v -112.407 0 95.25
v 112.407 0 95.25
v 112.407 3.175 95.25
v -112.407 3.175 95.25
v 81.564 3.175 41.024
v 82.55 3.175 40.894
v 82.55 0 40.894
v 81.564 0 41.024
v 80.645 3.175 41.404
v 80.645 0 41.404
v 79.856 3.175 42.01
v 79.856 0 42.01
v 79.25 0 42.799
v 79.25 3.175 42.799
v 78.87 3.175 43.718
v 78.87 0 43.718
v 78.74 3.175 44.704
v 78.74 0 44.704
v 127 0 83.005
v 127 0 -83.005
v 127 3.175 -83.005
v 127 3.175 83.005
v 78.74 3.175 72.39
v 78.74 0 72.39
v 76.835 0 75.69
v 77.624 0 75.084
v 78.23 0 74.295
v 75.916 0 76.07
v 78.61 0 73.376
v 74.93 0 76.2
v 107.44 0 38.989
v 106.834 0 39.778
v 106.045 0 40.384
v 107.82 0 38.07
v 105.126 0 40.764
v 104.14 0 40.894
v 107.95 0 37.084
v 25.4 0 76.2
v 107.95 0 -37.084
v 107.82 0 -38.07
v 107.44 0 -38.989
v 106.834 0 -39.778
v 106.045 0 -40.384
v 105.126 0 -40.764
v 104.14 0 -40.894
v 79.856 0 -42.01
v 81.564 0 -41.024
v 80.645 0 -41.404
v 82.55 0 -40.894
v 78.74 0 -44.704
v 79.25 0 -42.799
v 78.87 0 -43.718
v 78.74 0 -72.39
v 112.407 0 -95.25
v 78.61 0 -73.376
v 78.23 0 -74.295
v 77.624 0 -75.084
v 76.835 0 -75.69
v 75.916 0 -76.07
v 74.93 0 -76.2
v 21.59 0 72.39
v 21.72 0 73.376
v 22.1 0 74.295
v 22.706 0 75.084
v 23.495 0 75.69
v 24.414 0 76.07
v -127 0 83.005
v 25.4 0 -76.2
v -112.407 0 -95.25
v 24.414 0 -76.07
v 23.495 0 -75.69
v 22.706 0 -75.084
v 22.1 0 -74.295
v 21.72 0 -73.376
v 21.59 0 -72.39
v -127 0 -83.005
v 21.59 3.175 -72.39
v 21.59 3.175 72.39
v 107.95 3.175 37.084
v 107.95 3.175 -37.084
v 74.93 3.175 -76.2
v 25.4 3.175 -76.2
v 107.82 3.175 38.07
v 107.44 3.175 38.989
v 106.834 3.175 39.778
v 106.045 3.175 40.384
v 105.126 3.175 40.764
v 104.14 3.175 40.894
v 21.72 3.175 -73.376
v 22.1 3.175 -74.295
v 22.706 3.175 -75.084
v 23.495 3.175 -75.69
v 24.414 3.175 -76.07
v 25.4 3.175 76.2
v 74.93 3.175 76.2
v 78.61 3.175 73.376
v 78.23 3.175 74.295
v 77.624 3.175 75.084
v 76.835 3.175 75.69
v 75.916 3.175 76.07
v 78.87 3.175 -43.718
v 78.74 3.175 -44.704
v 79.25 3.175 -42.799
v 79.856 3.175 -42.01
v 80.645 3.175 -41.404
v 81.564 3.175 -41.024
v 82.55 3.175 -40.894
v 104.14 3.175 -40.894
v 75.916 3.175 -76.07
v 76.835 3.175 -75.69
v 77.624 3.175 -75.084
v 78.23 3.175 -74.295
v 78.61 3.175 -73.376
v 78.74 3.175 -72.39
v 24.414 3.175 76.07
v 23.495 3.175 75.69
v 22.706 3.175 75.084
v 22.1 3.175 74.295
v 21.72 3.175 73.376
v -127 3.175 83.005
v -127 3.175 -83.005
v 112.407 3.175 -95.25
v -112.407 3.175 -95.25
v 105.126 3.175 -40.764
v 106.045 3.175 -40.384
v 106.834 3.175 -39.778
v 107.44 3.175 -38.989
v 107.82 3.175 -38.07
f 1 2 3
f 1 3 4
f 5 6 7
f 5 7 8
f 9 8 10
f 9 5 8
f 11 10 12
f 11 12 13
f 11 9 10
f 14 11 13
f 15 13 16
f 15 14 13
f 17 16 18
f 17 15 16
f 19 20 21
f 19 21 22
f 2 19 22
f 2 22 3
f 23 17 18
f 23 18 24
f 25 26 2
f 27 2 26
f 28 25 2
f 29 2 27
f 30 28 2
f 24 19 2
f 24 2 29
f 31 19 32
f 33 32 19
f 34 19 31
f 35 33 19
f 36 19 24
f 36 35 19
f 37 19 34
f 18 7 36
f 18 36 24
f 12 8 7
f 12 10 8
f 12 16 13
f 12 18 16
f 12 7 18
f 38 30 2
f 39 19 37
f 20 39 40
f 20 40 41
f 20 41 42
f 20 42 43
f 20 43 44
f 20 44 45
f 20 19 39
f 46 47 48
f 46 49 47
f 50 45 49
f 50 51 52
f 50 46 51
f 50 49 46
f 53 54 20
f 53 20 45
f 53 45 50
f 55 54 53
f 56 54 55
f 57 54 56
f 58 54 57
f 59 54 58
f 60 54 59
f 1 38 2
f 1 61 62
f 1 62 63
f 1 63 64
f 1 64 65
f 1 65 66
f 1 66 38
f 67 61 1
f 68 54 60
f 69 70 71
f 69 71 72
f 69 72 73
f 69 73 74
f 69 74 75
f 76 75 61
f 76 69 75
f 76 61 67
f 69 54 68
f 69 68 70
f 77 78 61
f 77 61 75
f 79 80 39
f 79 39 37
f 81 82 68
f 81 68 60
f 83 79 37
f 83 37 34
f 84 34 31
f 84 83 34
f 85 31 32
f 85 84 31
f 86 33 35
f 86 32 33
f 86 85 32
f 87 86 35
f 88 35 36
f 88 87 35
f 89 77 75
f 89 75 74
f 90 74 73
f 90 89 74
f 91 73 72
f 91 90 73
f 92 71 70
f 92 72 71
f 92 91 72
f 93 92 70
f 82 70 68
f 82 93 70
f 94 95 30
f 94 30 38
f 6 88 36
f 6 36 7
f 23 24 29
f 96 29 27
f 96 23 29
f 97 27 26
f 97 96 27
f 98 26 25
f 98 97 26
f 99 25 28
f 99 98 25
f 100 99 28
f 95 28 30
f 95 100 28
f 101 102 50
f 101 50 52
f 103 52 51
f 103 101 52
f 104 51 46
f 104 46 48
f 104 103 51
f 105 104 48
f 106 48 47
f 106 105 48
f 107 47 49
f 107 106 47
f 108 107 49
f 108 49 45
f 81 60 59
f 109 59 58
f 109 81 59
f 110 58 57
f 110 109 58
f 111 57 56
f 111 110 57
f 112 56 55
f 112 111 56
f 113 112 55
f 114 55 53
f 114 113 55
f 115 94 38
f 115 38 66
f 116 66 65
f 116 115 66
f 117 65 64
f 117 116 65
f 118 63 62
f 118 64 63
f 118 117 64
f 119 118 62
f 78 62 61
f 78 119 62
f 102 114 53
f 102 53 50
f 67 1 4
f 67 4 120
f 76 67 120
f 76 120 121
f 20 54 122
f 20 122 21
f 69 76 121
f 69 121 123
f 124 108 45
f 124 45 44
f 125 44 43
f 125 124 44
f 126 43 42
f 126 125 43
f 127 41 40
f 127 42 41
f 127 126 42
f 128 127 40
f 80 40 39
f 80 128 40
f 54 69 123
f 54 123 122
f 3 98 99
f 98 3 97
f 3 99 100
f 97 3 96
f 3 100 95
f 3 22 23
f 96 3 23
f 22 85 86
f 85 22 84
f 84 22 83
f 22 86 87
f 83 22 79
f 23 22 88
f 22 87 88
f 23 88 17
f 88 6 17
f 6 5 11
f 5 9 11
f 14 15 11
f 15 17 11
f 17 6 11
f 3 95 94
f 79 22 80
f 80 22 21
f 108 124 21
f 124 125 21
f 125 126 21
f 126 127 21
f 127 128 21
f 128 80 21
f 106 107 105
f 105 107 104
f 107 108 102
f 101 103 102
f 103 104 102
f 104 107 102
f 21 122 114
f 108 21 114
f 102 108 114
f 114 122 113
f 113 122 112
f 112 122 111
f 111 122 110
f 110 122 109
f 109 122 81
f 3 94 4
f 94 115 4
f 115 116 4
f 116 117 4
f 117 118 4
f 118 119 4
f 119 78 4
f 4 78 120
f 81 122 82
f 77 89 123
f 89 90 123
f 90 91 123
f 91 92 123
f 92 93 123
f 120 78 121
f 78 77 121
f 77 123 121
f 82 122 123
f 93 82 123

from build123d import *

# Parameters (mm, degrees)
BOSS_EXTRUDE1_DEPTH = 3.175
CUT_EXTRUDE1_DEPTH  = 4.175


with BuildPart() as part:
    # Sketch1 → Boss-Extrude1 (new body)
    with BuildSketch(Plane(origin=(0, 0, 0), x_dir=(1, 0, 0), z_dir=(0, 1, 0))):
        Polygon((127, -83.004896035), (112.406853359, -95.25), (-112.406853359, -95.25), (-127, -83.004896035), (-127, 83.004896035), (-112.406853359, 95.25), (112.406853359, 95.25), (127, 83.004896035), align=None)
    extrude(amount=BOSS_EXTRUDE1_DEPTH)

    # Sketch2 → Cut-Extrude1 (cut, through all)
    with BuildSketch(Plane(origin=(0, 3.175, 0), x_dir=(1, 0, 0), z_dir=(0, 1, 0))):
        with BuildLine():
            Line((82.55, 40.894), (104.14, 40.894))
            ThreePointArc((104.14, 40.894), (106.834076836, 39.778076836), (107.95, 37.084))
            Line((107.95, 37.084), (107.95, -37.084))
            ThreePointArc((107.95, -37.084), (106.834076836, -39.778076836), (104.14, -40.894))
            Line((104.14, -40.894), (82.55, -40.894))
            ThreePointArc((82.55, -40.894), (79.855923164, -42.009923164), (78.74, -44.704))
            Line((78.74, -44.704), (78.74, -72.39))
            ThreePointArc((78.74, -72.39), (77.624076836, -75.084076836), (74.93, -76.2))
            Line((74.93, -76.2), (25.4, -76.2))
            ThreePointArc((25.4, -76.2), (22.705923164, -75.084076836), (21.59, -72.39))
            Line((21.59, -72.39), (21.59, 72.39))
            ThreePointArc((21.59, 72.39), (22.705923164, 75.084076836), (25.4, 76.2))
            Line((25.4, 76.2), (74.93, 76.2))
            ThreePointArc((74.93, 76.2), (77.624076836, 75.084076836), (78.74, 72.39))
            Line((78.74, 72.39), (78.74, 44.704))
            ThreePointArc((78.74, 44.704), (79.855923164, 42.009923164), (82.55, 40.894))
        make_face()
    extrude(amount=-CUT_EXTRUDE1_DEPTH, mode=Mode.SUBTRACT)


solid = part.part
